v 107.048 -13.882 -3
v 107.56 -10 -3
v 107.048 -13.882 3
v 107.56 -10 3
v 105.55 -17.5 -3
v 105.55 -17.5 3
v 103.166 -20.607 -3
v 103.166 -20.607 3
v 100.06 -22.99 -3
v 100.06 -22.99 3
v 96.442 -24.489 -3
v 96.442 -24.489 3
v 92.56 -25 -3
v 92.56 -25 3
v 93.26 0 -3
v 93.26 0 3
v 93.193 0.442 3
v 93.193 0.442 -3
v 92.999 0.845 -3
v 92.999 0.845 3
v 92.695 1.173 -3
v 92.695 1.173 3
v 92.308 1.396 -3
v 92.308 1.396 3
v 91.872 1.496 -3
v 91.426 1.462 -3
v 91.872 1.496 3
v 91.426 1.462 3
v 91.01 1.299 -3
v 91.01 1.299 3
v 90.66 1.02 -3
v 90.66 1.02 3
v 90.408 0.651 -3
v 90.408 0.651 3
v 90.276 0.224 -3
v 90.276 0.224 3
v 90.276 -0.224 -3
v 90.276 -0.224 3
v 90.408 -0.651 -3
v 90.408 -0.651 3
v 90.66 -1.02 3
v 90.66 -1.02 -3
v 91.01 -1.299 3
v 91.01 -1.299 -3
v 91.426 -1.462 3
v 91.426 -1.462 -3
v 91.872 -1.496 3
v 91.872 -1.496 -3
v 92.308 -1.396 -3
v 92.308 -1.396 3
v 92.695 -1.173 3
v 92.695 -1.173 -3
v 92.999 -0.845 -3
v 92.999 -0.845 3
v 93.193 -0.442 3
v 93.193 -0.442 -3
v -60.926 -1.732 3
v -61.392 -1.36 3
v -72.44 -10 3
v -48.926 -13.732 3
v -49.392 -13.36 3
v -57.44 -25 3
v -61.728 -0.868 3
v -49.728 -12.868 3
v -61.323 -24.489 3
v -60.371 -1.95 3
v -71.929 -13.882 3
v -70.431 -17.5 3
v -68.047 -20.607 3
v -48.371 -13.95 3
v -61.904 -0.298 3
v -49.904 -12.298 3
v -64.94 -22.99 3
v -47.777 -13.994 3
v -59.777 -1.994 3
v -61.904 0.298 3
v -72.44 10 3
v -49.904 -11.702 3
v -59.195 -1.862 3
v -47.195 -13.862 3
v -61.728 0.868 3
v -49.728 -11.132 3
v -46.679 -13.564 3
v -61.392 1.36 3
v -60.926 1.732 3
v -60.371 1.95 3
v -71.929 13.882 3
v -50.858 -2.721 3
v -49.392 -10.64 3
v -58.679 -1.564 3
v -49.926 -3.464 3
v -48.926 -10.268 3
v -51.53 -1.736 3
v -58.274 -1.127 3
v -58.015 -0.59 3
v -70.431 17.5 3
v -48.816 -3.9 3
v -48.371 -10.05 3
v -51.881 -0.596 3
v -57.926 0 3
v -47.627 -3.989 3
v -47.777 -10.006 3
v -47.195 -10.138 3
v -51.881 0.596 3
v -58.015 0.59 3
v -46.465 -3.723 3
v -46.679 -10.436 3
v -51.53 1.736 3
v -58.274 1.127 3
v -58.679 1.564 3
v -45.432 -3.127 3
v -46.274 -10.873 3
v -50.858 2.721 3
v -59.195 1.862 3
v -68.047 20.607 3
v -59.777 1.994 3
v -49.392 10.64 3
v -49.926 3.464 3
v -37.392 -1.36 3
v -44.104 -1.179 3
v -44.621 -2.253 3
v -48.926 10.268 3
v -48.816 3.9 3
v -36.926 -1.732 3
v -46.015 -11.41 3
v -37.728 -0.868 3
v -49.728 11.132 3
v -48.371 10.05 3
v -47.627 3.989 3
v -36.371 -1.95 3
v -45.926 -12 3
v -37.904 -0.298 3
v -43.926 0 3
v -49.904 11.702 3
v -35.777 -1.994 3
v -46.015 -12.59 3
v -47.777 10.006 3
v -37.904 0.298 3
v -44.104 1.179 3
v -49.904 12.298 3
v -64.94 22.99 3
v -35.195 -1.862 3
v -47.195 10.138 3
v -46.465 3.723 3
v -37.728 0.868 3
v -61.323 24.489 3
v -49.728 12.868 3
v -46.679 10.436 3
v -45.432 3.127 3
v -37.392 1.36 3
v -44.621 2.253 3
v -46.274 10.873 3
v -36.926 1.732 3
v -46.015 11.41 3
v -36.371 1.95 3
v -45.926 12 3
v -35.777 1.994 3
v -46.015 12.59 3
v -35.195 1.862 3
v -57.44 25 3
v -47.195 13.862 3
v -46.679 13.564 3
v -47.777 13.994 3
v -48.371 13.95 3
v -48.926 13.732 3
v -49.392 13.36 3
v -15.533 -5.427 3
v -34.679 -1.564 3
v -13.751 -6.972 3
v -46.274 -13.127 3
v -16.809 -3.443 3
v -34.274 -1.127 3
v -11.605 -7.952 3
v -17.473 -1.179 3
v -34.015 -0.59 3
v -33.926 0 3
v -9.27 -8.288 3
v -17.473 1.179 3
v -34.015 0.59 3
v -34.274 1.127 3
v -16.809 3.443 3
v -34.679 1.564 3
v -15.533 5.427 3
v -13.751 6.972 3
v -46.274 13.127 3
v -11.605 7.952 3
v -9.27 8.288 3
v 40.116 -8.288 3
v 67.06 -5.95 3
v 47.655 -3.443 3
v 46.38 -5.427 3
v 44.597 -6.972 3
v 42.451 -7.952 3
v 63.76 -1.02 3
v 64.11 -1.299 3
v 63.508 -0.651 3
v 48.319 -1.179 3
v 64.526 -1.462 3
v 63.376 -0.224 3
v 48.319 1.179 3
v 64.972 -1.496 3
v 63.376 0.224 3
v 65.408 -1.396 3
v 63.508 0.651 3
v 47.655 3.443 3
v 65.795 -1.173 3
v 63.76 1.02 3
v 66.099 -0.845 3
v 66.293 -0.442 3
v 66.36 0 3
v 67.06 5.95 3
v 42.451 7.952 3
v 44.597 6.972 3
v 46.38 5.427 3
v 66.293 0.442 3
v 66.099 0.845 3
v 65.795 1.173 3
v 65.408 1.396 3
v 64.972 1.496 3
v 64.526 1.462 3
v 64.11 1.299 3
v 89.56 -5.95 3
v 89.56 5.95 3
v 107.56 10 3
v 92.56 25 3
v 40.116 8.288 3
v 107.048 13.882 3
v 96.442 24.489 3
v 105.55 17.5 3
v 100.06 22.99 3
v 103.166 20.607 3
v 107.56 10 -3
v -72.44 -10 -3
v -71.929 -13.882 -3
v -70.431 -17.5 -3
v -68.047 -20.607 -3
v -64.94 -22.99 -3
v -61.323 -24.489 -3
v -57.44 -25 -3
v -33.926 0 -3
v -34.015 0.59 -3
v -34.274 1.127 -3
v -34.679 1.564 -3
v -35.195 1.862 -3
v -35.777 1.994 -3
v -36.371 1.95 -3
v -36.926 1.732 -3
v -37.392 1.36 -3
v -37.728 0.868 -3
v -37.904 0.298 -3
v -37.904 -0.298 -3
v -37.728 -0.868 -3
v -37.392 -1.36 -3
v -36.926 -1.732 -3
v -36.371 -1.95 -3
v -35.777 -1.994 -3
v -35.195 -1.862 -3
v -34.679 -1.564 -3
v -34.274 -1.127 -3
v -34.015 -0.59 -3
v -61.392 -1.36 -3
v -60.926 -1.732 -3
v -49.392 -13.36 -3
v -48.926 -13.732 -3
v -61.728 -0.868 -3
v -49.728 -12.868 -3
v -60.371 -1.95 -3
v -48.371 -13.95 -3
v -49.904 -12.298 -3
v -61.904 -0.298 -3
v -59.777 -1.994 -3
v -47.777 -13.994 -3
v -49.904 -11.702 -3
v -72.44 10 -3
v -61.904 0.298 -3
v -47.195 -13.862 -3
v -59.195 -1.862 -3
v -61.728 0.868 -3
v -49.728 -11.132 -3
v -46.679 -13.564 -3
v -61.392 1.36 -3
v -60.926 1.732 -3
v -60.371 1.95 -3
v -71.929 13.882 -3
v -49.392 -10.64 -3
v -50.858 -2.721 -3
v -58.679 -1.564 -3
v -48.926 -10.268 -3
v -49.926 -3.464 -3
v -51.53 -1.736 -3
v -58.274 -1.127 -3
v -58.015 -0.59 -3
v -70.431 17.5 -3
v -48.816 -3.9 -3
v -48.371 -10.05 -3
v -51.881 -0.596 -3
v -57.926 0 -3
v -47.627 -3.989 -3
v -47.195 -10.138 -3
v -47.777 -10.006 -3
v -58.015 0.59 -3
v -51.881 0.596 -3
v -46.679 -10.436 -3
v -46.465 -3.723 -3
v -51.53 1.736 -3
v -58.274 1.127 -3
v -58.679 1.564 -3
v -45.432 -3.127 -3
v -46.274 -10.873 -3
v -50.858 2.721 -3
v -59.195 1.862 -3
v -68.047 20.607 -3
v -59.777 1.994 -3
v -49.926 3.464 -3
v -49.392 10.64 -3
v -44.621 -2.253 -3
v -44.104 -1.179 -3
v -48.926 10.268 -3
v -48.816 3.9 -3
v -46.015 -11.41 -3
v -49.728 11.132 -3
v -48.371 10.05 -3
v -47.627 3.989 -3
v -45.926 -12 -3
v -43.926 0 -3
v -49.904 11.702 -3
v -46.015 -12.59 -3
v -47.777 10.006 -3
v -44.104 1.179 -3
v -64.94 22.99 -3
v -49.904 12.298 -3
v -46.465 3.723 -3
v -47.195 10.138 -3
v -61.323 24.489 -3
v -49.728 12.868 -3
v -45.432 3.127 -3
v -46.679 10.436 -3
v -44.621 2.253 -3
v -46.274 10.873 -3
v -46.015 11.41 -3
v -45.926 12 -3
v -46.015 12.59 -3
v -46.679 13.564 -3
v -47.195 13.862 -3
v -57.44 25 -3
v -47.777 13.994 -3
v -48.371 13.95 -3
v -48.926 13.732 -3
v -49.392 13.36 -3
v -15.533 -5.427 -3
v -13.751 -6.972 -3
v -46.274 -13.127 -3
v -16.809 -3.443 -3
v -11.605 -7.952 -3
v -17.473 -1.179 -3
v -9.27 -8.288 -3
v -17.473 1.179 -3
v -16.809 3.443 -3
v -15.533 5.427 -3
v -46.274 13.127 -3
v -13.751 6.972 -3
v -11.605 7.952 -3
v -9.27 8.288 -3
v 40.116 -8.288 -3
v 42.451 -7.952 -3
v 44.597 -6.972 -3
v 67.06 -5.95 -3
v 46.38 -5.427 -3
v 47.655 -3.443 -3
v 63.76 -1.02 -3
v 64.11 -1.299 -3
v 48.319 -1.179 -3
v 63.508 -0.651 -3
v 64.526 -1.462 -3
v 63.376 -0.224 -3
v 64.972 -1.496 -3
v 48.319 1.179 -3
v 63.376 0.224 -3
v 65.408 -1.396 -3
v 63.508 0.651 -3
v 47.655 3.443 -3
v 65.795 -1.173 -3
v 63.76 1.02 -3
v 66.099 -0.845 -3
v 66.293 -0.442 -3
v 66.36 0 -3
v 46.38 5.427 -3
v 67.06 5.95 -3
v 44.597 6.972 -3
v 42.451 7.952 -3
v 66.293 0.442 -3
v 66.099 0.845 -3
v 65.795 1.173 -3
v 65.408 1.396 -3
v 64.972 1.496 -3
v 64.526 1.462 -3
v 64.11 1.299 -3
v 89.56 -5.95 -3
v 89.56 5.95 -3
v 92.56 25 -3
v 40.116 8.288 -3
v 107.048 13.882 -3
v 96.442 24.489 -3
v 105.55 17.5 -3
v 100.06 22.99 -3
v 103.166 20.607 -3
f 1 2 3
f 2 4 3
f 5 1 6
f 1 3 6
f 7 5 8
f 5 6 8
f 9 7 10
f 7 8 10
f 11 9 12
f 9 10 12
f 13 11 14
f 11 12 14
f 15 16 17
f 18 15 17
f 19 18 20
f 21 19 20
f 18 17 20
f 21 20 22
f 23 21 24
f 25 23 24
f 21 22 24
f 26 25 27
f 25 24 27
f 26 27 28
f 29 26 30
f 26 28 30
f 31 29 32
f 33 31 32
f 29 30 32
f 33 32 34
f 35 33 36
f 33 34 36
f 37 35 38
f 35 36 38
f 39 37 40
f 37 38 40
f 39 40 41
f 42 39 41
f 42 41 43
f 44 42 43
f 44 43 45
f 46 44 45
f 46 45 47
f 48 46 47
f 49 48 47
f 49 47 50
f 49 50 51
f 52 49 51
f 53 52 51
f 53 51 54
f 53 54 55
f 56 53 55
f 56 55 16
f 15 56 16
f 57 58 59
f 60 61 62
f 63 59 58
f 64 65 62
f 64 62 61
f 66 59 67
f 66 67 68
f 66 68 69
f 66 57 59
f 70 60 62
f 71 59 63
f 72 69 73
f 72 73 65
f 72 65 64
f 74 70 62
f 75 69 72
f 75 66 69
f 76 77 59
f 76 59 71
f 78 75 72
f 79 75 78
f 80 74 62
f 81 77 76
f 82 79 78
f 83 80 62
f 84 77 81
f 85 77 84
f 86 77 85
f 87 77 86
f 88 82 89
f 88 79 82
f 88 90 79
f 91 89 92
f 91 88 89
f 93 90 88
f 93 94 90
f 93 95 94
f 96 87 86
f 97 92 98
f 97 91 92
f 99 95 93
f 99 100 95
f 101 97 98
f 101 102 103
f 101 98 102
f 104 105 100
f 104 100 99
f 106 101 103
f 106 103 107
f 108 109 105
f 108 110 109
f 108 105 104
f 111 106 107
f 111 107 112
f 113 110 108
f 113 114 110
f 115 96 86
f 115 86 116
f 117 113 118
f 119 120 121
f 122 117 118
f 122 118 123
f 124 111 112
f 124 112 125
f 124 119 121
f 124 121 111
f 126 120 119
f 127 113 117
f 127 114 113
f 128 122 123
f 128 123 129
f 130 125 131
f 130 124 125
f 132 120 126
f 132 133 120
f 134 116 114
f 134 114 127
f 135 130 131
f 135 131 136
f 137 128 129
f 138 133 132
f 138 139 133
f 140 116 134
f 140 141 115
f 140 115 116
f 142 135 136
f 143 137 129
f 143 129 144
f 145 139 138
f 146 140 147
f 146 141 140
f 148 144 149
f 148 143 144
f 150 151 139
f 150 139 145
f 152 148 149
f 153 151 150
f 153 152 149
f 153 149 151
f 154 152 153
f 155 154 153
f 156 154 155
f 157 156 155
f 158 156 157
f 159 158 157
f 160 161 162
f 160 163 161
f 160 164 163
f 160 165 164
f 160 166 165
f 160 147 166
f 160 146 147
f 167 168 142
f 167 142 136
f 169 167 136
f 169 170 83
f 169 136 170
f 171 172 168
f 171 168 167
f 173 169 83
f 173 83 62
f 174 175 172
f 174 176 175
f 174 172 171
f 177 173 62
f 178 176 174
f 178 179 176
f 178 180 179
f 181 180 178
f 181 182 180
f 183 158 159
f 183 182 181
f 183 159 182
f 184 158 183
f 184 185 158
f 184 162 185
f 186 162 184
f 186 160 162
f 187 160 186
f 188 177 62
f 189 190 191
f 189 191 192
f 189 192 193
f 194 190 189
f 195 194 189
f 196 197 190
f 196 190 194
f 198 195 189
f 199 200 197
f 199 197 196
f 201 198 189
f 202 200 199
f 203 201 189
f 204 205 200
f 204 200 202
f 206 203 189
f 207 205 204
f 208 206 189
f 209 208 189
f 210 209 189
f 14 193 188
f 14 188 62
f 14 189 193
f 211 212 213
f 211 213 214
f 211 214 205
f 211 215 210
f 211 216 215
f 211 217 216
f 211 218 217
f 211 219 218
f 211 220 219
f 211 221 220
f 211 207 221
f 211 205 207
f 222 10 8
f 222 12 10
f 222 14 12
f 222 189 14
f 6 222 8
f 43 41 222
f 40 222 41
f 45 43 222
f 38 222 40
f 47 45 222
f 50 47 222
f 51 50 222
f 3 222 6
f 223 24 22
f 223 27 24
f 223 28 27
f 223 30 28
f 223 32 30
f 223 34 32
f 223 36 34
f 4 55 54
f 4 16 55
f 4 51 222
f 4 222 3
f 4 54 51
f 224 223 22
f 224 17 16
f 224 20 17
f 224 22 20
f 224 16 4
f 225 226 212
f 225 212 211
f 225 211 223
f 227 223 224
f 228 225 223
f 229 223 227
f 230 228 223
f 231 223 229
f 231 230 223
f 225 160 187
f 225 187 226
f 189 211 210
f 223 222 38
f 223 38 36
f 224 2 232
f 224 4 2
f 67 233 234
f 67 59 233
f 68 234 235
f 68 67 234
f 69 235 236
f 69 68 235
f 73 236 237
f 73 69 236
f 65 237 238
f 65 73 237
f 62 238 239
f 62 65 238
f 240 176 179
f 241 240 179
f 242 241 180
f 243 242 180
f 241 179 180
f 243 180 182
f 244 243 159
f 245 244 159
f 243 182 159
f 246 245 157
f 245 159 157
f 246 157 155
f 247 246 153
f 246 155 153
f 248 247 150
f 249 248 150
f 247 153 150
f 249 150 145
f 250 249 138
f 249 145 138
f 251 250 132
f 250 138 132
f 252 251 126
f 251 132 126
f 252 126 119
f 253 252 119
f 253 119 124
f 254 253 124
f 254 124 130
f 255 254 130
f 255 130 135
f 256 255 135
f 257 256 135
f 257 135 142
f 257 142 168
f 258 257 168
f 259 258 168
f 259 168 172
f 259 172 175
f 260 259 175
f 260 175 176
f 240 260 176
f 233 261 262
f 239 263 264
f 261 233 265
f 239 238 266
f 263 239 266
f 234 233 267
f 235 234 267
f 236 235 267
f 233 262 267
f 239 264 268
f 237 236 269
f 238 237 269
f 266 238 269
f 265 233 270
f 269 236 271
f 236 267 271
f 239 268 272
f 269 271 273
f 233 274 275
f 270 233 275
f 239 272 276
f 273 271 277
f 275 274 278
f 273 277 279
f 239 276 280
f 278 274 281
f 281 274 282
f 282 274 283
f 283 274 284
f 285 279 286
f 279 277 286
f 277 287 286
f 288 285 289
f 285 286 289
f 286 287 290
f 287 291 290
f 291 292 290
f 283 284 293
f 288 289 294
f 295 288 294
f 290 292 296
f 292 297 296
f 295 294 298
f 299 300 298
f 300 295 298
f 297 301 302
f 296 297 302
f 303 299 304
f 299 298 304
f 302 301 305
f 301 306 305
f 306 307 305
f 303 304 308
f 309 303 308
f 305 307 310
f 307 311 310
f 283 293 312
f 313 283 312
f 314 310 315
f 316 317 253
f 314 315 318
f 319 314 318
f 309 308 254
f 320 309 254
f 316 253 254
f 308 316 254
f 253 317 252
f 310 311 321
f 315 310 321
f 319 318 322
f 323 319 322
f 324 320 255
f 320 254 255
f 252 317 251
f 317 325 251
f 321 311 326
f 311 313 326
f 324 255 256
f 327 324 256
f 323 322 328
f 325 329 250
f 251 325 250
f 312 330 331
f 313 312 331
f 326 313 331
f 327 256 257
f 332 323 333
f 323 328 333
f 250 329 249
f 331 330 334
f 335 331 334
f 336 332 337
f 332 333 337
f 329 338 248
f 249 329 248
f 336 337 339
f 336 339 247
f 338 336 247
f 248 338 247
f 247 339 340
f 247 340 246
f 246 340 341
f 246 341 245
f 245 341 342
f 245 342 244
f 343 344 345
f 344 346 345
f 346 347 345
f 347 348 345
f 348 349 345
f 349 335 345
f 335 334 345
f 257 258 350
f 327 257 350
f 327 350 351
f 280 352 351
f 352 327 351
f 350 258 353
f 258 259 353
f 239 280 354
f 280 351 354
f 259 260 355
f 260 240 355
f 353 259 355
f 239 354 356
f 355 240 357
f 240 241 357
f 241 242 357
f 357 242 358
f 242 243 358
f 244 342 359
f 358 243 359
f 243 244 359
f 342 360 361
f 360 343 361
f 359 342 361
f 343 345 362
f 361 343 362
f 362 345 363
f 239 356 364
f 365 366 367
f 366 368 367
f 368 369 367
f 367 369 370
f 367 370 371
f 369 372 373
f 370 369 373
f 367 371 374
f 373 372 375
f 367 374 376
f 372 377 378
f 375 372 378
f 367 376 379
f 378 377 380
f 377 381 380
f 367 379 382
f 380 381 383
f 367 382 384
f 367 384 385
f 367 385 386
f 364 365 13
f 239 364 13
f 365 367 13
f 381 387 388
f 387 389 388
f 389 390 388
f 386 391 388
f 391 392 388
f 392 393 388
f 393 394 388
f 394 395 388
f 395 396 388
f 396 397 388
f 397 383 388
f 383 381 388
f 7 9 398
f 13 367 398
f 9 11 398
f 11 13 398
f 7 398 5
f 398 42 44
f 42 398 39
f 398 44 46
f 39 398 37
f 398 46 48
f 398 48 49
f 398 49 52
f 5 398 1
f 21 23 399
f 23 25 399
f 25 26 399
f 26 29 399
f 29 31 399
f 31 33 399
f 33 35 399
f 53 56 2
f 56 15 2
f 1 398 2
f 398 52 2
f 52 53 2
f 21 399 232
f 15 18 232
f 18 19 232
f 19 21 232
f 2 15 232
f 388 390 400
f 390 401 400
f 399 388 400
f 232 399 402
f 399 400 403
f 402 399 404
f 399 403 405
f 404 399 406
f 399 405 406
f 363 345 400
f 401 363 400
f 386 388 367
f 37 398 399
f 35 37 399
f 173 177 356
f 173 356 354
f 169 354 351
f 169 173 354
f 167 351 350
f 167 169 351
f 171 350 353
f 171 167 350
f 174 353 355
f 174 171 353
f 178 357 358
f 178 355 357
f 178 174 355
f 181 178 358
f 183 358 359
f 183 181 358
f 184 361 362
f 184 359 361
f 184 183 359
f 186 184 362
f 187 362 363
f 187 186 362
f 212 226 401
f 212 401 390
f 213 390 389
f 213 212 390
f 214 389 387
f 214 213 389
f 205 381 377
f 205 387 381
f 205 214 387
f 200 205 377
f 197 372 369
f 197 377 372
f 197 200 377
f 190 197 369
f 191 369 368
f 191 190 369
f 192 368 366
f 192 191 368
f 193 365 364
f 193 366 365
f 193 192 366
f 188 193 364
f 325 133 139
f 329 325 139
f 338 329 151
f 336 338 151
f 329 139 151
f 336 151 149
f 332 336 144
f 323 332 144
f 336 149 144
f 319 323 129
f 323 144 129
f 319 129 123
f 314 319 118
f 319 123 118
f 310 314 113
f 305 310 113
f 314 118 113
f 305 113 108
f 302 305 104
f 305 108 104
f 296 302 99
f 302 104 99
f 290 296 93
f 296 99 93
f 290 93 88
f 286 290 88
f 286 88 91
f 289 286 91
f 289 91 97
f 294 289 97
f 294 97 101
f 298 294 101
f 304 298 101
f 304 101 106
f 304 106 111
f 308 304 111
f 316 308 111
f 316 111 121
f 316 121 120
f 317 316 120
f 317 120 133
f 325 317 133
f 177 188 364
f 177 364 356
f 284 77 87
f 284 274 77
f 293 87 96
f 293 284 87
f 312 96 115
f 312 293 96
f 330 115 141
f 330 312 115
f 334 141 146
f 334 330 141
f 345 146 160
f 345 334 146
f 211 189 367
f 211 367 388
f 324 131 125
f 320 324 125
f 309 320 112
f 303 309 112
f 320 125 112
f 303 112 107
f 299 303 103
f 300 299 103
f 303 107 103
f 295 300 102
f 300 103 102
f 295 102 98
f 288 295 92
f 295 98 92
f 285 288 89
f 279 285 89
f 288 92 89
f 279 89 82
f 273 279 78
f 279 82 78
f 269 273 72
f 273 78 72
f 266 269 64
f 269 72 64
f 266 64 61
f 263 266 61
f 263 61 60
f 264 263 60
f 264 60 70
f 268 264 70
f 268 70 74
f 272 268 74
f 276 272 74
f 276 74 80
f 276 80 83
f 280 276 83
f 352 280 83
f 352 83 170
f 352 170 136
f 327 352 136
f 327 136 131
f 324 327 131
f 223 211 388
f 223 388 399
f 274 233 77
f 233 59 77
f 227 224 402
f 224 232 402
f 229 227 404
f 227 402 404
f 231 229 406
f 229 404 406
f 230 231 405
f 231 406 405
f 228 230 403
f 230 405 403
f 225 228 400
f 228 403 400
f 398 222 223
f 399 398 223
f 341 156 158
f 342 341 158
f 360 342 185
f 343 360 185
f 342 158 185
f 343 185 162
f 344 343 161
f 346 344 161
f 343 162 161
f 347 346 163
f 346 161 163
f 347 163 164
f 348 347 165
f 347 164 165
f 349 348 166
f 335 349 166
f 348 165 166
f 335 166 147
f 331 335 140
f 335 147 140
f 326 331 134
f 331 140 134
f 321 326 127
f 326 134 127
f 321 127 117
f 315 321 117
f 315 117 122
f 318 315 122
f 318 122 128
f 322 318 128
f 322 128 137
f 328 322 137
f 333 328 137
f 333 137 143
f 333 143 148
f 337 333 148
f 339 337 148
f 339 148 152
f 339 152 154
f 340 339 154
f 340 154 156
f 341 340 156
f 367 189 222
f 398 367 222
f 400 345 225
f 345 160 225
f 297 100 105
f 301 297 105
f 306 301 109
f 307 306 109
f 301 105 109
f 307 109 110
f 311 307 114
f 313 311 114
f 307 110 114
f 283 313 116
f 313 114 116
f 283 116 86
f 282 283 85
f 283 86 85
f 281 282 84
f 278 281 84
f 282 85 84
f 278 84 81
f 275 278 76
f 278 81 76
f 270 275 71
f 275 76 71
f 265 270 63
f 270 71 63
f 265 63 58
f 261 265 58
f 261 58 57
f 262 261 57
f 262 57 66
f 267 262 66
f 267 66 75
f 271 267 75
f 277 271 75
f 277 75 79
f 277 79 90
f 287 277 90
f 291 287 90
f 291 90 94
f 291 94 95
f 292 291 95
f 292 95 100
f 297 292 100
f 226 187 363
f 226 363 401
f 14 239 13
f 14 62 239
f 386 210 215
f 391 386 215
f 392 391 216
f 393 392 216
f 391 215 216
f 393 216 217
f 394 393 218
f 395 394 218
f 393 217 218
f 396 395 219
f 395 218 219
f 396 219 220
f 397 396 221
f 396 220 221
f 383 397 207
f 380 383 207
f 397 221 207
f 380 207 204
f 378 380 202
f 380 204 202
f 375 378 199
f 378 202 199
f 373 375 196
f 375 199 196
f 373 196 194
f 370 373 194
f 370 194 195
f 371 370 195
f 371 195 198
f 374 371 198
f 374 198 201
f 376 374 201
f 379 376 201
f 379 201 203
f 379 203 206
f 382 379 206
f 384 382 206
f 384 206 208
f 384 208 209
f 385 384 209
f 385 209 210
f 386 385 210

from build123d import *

# Parameters (mm, degrees)
SKETCH1_W           = 180
SKETCH1_H           = 50
BOSS_EXTRUDE1_DEPTH = 3
FILLET1_R           = 15
SKETCH3_R           = 4
SKETCH3_R_2         = 2
CUT_EXTRUDE1_DEPTH  = 8
SKETCH4_R           = 1.5
SKETCH4_W           = 22.5
SKETCH4_H           = 11.9
CUT_EXTRUDE2_DEPTH  = 10


with BuildPart() as part:
    # Sketch1 → Boss-Extrude1 (new body, symmetric)
    with BuildSketch(Plane.XY):
        with Locations((17.559596495, 0)):
            Rectangle(SKETCH1_W, SKETCH1_H)
    extrude(amount=BOSS_EXTRUDE1_DEPTH, both=True)

    # Fillet1
    fillet1_edges = [part.edges().sort_by_distance(p)[0] for p in [
        (107.559596495, -25, 0),
        (-72.440403505, -25, 0),
        (-72.440403505, 25, 0),
        (107.559596495, 25, 0),
    ]]
    fillet(fillet1_edges, radius=FILLET1_R)

    # Sketch3 → Cut-Extrude1 (cut)
    with BuildSketch(Plane.XY.offset(3)):
        with Locations((-47.926163707, 0)):
            Circle(SKETCH3_R)
        with Locations((-47.926163707, 12)):
            Circle(SKETCH3_R_2)
        with Locations((-47.926163707, -12)):
            Circle(SKETCH3_R_2)
        with Locations((-59.926163707, 0)):
            Circle(SKETCH3_R_2)
        with Locations((-35.926163707, 0)):
            Circle(SKETCH3_R_2)
    extrude(amount=-CUT_EXTRUDE1_DEPTH, mode=Mode.SUBTRACT)

    # Sketch4 → Cut-Extrude2 (cut)
    with BuildSketch(Plane.XY.offset(3)):
        with Locations((64.859596495, 0)):
            Circle(SKETCH4_R)
        with Locations((91.759596495, 0)):
            Circle(SKETCH4_R)
        with Locations((78.309596495, 0)):
            Rectangle(SKETCH4_W, SKETCH4_H)
        with BuildLine():
            Line((-9.269868987, 8.287867606), (40.115980257, 8.287867606))
            ThreePointArc((40.115980257, 8.287867606), (48.403847863, 0), (40.115980257, -8.287867606))
            Line((40.115980257, -8.287867606), (-9.269868987, -8.287867606))
            ThreePointArc((-9.269868987, -8.287867606), (-17.557736593, 0), (-9.269868987, 8.287867606))
        make_face()
    extrude(amount=-CUT_EXTRUDE2_DEPTH, mode=Mode.SUBTRACT)


solid = part.part
